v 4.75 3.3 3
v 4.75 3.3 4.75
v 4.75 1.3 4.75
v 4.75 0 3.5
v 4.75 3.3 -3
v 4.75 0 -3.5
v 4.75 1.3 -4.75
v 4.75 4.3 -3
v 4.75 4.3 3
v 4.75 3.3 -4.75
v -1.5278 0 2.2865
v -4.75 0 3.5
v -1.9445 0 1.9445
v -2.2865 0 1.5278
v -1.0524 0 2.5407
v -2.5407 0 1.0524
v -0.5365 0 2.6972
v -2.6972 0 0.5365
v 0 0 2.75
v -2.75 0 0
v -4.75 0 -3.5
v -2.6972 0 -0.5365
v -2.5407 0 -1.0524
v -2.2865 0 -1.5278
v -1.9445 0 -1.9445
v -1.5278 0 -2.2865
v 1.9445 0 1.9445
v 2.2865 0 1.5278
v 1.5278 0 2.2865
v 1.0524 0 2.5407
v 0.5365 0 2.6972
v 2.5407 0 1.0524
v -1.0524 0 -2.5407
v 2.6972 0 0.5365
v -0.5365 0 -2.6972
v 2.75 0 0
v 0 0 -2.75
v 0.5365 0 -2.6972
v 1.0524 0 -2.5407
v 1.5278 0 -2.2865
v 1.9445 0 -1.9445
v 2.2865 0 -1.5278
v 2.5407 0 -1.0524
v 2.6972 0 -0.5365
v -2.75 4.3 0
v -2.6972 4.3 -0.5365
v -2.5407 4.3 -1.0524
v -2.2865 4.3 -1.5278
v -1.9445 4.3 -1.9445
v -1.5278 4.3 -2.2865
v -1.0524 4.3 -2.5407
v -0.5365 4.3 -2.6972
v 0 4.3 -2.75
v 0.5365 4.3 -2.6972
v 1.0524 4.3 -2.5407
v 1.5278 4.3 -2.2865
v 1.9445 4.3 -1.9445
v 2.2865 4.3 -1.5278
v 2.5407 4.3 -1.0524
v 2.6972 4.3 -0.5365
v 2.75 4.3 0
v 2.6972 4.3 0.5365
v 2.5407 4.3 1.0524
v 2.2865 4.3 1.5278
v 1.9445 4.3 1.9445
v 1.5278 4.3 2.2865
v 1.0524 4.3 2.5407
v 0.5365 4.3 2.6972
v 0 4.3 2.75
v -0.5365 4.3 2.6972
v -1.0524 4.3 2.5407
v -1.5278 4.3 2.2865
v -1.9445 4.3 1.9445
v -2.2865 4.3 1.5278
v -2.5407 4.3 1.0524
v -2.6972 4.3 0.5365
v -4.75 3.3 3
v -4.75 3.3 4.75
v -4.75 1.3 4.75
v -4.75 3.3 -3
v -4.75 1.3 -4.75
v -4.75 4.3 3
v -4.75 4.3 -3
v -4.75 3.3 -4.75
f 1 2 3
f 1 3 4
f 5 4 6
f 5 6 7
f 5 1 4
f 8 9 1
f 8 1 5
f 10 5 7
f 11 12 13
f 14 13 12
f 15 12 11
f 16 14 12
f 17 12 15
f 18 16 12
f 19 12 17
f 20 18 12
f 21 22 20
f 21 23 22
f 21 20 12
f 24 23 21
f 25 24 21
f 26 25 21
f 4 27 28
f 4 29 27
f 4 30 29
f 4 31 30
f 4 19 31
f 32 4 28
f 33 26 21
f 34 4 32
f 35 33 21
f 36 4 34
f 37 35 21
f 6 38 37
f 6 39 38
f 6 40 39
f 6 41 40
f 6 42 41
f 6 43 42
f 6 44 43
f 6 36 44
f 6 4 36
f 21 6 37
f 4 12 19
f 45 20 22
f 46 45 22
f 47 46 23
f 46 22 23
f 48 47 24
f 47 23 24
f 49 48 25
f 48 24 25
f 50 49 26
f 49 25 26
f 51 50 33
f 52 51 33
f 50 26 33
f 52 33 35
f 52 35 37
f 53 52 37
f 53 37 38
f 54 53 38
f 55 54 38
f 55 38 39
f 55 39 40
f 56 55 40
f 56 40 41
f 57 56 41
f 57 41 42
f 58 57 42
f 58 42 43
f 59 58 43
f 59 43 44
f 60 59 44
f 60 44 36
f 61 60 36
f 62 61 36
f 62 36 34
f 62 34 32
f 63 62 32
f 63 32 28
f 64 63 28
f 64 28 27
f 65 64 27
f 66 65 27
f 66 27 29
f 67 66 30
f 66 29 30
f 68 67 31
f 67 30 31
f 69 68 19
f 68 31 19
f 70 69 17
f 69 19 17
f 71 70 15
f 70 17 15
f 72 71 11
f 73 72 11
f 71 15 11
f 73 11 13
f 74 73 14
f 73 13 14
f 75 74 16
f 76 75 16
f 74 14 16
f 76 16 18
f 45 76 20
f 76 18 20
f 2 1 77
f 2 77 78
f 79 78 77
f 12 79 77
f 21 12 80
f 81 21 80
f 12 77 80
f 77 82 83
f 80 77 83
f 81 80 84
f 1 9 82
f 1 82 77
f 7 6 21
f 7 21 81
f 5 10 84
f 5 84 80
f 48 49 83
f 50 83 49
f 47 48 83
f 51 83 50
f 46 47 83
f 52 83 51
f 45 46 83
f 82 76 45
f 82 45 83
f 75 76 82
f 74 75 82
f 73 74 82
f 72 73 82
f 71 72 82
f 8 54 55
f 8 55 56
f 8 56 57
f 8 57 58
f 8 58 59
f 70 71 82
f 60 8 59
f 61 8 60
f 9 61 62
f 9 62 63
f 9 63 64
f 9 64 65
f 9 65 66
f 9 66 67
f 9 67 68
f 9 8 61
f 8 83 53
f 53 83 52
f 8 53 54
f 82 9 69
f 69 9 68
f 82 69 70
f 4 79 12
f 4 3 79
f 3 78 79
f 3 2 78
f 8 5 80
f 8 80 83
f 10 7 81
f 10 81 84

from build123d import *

# Parameters (mm, degrees)
BODY_DEPTH           = 4.75
M5_CLEARANCE_HOLE1_D = 5.5


with BuildPart() as part:
    # Sketch1 → Body (new, symmetric)
    with BuildSketch(Plane(origin=(0, 0, 0), x_dir=(0, 0, -1), z_dir=(1, 0, 0))):
        Polygon((-3.5, 0), (3.5, 0), (4.75, 1.3), (4.75, 3.3), (3, 3.3), (3, 4.3), (-3, 4.3), (-3, 3.3), (-4.75, 3.3), (-4.75, 1.3), align=None)
    extrude(amount=BODY_DEPTH, both=True)

    # M5 Clearance Hole1 (through all)
    with Locations(Plane(origin=(0, 4.3, 0), x_dir=(1, 0, 0), z_dir=(0, 1, 0))):
        with Locations((0, 0)):
            Hole(M5_CLEARANCE_HOLE1_D / 2)


solid = part.part
